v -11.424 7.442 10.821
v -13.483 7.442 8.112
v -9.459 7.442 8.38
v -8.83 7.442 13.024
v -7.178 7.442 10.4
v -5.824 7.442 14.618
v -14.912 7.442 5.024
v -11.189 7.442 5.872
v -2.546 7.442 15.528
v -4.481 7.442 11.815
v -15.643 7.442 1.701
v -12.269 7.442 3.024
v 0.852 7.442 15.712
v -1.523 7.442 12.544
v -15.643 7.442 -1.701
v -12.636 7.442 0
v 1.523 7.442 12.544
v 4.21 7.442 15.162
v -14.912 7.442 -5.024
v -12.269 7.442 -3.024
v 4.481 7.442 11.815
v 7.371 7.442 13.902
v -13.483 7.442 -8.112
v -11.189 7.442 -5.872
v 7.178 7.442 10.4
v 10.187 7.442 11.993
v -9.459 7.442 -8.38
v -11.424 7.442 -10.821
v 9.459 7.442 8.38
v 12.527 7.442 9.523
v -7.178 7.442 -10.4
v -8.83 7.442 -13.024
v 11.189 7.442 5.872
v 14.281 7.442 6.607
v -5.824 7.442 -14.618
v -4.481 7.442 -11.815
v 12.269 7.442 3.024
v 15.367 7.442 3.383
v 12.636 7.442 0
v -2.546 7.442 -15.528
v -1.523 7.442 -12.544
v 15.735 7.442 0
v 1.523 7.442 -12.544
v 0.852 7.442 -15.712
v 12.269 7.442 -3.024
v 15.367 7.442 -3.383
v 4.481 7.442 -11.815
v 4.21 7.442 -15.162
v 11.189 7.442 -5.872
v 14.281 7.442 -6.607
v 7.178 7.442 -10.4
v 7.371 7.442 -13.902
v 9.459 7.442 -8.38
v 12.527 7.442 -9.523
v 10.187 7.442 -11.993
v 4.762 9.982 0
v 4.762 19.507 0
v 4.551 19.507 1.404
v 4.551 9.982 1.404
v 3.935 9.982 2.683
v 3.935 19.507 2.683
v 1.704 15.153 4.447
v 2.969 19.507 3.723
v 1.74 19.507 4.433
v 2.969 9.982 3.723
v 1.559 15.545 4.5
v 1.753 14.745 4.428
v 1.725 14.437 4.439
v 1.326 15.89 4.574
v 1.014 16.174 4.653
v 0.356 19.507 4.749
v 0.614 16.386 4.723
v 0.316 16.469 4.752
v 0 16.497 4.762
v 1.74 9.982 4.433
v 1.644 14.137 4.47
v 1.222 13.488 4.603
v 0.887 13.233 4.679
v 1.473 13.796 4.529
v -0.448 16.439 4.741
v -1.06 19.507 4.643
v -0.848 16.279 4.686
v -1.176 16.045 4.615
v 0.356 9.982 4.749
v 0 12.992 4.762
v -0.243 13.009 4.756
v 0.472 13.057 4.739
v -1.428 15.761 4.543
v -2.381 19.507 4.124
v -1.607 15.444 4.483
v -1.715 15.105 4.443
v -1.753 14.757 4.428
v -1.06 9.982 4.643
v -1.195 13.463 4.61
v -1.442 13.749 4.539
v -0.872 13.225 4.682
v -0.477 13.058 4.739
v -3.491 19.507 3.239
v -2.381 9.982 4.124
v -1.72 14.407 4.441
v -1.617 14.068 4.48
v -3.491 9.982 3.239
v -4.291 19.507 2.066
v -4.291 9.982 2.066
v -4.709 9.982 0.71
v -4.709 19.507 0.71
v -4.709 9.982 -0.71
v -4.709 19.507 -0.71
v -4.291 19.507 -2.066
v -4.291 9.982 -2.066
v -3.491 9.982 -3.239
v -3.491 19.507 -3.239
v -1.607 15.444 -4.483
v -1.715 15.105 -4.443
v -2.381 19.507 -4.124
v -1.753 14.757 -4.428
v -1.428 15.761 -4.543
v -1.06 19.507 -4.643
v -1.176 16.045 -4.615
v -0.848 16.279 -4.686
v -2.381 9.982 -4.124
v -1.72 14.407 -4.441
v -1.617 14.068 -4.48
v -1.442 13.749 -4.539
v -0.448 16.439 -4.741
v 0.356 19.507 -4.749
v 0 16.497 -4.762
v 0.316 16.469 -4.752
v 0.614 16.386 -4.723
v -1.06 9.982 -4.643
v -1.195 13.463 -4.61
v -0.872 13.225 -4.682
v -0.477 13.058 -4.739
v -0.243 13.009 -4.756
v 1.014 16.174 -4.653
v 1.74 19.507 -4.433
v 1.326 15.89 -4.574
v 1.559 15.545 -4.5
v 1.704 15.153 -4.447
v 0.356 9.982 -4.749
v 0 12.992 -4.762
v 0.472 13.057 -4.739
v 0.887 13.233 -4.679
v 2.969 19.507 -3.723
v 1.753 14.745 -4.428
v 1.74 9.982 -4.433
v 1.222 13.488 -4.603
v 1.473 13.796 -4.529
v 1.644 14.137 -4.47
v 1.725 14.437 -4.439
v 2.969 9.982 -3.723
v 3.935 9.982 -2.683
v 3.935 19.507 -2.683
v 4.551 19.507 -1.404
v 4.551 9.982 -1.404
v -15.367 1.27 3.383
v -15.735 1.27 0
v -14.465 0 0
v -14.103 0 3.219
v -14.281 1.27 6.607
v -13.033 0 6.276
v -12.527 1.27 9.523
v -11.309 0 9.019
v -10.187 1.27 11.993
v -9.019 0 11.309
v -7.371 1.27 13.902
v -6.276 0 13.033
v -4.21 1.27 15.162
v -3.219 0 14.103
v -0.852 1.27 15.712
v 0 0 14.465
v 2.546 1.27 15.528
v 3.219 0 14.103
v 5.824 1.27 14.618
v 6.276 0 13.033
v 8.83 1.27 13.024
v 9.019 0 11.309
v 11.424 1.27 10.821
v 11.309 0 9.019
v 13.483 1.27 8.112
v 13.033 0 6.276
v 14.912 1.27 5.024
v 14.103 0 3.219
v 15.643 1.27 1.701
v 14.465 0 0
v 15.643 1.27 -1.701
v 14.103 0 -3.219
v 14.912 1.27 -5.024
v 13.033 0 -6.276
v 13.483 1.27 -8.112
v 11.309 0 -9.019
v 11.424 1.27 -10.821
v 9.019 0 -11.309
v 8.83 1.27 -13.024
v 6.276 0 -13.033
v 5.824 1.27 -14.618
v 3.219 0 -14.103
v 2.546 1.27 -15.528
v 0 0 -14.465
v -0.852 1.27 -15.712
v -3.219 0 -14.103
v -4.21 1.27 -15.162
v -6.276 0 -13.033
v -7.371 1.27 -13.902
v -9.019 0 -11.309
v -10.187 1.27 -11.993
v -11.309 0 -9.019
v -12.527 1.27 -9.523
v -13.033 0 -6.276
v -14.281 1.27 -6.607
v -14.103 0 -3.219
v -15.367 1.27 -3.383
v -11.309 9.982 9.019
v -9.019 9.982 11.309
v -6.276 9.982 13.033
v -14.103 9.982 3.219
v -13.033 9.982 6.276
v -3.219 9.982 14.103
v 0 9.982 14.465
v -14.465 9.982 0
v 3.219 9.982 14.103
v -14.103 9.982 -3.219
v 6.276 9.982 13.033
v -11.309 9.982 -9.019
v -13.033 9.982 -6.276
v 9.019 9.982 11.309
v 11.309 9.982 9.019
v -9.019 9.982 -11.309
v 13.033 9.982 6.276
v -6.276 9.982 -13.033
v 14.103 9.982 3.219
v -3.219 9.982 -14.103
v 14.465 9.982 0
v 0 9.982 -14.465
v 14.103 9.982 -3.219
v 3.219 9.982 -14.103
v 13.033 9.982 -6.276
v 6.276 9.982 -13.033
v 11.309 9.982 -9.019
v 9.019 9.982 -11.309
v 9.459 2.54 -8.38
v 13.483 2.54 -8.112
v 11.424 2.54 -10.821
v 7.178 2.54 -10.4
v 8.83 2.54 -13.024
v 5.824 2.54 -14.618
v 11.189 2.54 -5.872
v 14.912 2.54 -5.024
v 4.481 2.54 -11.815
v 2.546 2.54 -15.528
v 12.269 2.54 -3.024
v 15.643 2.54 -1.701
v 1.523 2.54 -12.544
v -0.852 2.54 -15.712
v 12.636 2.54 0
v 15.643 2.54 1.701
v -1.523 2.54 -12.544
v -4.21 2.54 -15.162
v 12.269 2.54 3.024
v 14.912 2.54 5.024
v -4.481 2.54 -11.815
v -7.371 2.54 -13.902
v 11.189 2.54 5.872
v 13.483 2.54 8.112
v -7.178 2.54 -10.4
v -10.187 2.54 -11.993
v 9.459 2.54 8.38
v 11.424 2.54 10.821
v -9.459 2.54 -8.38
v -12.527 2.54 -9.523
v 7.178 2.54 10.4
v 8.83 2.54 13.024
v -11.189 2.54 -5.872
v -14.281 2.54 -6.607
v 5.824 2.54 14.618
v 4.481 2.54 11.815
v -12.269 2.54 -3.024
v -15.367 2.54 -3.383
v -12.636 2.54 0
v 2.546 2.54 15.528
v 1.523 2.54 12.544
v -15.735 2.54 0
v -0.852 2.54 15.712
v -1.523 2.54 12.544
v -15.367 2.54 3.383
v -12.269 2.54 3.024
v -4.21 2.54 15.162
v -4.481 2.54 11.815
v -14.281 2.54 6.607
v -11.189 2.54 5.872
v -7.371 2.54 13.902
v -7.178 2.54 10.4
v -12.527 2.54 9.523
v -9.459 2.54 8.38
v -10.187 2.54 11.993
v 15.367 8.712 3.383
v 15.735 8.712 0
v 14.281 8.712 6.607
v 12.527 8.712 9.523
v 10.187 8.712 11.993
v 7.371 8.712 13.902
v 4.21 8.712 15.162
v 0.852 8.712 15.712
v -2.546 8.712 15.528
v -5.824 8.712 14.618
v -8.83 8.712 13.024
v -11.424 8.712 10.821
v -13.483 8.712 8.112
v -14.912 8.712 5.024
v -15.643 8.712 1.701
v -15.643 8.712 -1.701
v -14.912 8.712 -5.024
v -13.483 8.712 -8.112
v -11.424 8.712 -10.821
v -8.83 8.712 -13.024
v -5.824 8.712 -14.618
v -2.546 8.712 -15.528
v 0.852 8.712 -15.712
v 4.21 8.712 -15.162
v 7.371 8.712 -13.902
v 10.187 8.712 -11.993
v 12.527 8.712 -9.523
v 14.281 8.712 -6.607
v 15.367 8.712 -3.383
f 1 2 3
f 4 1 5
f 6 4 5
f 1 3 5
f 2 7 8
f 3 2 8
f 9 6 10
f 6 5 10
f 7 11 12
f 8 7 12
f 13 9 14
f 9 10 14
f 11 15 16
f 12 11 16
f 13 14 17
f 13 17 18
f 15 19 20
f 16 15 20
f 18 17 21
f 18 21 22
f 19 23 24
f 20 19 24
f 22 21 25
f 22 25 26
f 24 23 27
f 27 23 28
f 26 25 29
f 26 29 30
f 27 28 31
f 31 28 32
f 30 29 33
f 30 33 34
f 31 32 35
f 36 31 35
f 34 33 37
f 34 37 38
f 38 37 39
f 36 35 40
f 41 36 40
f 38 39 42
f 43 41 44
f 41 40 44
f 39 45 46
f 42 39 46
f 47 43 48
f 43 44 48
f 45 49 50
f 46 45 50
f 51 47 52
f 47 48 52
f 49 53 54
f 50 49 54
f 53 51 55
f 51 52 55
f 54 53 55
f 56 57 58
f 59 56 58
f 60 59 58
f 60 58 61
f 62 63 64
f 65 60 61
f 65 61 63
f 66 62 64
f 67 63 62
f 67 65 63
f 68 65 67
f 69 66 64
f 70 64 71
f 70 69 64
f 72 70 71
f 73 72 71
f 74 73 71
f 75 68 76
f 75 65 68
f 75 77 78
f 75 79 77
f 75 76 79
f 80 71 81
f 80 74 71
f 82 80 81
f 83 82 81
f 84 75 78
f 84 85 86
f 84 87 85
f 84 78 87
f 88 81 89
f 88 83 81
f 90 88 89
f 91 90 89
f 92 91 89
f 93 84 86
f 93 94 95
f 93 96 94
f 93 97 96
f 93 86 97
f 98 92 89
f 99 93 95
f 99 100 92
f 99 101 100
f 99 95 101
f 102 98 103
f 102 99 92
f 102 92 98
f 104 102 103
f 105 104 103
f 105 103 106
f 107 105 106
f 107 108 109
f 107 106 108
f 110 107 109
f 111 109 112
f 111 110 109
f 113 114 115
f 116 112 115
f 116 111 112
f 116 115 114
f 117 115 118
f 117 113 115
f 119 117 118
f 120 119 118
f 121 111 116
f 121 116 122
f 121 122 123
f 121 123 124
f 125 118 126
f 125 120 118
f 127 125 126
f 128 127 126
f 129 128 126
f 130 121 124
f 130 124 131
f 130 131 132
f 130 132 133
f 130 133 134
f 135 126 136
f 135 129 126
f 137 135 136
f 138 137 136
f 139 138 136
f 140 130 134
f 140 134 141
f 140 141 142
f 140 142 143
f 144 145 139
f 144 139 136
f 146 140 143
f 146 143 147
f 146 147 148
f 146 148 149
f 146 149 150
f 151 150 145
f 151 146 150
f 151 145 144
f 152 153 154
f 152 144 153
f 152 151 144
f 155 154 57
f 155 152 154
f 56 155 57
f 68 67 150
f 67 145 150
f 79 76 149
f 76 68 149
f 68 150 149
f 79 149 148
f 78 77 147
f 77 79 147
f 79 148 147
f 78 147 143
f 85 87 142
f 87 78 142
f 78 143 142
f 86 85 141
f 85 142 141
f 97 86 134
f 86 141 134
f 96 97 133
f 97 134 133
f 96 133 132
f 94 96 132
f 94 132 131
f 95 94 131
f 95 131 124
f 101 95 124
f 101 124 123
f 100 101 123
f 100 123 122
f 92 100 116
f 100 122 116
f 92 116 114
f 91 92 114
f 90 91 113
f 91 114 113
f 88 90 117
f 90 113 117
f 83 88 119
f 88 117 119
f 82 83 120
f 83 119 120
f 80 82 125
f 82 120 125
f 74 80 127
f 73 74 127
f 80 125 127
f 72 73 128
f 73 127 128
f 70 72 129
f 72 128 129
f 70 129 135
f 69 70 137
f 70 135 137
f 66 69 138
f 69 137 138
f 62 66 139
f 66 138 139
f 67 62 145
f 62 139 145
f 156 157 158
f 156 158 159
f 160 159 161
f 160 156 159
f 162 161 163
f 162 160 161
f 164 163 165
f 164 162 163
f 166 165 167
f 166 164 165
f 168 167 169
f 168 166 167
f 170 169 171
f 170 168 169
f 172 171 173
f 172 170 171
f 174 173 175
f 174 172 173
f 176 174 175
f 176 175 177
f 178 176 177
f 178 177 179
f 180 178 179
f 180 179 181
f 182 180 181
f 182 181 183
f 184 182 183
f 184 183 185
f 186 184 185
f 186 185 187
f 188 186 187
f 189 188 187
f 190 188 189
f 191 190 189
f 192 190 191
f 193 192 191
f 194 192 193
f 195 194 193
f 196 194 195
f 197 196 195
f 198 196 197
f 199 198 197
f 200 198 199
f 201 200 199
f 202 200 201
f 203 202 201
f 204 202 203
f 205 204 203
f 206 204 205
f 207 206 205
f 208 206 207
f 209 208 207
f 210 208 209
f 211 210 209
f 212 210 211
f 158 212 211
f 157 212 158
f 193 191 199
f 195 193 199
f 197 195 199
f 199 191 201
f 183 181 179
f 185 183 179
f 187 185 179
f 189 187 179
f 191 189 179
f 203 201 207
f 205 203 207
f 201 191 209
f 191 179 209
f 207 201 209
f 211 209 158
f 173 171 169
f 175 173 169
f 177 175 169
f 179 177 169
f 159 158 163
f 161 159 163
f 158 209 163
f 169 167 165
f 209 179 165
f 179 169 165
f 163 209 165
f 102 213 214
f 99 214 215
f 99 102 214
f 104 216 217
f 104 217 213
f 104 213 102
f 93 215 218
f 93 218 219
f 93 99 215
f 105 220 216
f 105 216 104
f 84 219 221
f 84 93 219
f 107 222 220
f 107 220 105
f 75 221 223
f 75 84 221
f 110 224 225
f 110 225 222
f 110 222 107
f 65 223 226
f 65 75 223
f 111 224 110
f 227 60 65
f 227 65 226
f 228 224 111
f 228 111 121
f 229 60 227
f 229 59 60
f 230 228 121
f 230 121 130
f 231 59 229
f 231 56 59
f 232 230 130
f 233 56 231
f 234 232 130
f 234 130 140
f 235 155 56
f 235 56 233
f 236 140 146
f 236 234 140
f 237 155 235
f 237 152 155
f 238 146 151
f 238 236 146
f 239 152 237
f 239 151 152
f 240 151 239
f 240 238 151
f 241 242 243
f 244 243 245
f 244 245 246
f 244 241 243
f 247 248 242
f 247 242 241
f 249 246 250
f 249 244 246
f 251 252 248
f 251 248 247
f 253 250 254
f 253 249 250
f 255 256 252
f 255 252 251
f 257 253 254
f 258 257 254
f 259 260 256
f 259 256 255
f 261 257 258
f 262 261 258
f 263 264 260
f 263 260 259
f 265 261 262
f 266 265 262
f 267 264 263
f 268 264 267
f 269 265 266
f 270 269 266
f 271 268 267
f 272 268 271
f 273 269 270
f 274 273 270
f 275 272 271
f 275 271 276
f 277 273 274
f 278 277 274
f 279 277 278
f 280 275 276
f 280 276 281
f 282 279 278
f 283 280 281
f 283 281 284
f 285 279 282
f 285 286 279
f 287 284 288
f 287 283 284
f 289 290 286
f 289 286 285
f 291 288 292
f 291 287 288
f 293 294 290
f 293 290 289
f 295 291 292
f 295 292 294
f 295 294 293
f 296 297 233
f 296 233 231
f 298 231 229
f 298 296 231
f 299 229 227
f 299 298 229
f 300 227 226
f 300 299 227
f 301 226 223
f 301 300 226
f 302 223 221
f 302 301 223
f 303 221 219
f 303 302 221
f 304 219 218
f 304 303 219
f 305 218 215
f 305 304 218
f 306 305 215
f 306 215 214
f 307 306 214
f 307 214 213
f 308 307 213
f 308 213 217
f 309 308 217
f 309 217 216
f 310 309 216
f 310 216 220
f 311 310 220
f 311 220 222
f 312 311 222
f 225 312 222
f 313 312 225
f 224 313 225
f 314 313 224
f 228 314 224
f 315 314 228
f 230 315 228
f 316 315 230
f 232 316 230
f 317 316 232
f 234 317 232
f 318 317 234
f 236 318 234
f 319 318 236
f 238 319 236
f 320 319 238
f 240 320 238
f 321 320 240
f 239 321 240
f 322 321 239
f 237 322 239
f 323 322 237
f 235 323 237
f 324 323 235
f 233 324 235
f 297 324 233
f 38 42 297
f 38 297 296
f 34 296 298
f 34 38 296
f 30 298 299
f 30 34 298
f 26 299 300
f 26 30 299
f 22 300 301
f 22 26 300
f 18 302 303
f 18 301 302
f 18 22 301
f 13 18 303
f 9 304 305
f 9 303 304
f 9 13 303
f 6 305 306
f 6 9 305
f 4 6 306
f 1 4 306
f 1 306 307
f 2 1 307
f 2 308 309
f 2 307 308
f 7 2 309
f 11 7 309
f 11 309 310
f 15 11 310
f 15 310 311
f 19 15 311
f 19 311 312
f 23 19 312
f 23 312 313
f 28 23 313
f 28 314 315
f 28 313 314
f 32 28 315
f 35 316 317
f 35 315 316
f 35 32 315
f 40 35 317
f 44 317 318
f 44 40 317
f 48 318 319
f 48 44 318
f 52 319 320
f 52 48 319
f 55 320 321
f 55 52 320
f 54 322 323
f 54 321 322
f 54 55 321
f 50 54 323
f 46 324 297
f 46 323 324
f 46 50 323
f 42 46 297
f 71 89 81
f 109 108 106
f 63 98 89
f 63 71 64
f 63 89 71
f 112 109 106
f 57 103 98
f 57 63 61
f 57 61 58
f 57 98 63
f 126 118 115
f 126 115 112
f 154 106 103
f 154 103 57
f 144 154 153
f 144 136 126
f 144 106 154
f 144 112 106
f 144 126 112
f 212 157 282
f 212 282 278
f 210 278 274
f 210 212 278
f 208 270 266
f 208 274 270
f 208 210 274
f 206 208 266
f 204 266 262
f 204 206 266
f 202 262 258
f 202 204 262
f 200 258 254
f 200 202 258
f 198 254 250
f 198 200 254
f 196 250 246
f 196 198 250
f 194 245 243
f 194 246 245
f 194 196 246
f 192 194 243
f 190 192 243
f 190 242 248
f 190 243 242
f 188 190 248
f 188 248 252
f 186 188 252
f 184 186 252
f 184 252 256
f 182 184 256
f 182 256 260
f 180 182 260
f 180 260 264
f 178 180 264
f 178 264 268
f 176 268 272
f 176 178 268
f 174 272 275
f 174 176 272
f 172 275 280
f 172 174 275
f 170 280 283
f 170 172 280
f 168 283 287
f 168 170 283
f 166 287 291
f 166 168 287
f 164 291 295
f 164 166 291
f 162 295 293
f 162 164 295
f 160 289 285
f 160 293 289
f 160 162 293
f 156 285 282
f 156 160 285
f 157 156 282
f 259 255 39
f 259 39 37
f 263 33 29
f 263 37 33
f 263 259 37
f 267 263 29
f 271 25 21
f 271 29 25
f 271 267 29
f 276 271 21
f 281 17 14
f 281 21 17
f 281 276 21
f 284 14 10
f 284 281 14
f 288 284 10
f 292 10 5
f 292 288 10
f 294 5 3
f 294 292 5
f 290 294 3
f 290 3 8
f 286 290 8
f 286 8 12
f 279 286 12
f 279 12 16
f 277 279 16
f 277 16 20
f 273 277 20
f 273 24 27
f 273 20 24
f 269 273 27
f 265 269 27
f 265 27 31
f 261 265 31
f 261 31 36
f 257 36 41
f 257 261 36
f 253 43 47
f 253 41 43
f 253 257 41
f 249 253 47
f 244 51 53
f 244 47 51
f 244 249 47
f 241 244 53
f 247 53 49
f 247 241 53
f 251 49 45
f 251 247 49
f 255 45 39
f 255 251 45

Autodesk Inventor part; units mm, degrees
ref_plane "YZ Plane" through (0, 0, 0) normal (1, 0, 0) x (0, 1, 0)
ref_plane "XZ Plane" through (0, 0, 0) normal (0, 1, 0) x (-1, 0, 0)
sketch "Sketch1" plane through (0, 0, 0) normal (0, 1, 0) x (-1, 0, 0)
  circle A0 centre (0, 0) radius 15.7353
  dimension "d0" = 31.4706
extrude "Extrusion1" add sketch "Sketch1" along normal blind 2.54
sketch "Sketch2" plane through (0, 2.54, 0) normal (0, 1, 0) x (1, 0, 0)
  circle A0 centre (0, 0) radius 12.6365
  dimension "d3" = 25.273
extrude "Extrusion2" add sketch "Sketch2" along normal blind 4.9022
sketch "Sketch3" plane through (0, 7.4422, 0) normal (0, 1, 0) x (1, 0, 0)
  circle A0 centre (0, 0) radius 15.7353
  dimension "d6" = 31.4706
extrude "Extrusion3" add sketch "Sketch3" along normal blind 2.54
chamfer "Chamfer1" distance 1.27 angle 45 2 edges at (-15.7353, 9.9822, 0) (15.7353, 0, 0)
sketch "Sketch4" plane through (0, 9.9822, 0) normal (0, 1, 0) x (1, 0, 0)
  circle A0 centre (0, 0) radius 4.7625
  dimension "d12" = 9.525
extrude "Extrusion4" add sketch "Sketch4" along normal blind 9.525
ref_plane "Work Plane1" through (0, 9.9822, -4.7625) normal (0, 0, 1) x (1, 0, 0)
sketch "Sketch5" plane through (0, 9.9822, -4.7625) normal (0, 0, 1) x (1, 0, 0)
  circle A0 centre (0, 4.7625) radius 1.7526
  line L0 (-14.4653, 0) -> (14.4653, 0) projected
  point P0 (0, -9.9822)
  dimension "d15" = 3.5052
  dimension "d16" = 4.7625
extrude "Extrusion5" cut sketch "Sketch5" along normal blind 9.525
properties part number "Plug" material "Acetal Resin, Black"
